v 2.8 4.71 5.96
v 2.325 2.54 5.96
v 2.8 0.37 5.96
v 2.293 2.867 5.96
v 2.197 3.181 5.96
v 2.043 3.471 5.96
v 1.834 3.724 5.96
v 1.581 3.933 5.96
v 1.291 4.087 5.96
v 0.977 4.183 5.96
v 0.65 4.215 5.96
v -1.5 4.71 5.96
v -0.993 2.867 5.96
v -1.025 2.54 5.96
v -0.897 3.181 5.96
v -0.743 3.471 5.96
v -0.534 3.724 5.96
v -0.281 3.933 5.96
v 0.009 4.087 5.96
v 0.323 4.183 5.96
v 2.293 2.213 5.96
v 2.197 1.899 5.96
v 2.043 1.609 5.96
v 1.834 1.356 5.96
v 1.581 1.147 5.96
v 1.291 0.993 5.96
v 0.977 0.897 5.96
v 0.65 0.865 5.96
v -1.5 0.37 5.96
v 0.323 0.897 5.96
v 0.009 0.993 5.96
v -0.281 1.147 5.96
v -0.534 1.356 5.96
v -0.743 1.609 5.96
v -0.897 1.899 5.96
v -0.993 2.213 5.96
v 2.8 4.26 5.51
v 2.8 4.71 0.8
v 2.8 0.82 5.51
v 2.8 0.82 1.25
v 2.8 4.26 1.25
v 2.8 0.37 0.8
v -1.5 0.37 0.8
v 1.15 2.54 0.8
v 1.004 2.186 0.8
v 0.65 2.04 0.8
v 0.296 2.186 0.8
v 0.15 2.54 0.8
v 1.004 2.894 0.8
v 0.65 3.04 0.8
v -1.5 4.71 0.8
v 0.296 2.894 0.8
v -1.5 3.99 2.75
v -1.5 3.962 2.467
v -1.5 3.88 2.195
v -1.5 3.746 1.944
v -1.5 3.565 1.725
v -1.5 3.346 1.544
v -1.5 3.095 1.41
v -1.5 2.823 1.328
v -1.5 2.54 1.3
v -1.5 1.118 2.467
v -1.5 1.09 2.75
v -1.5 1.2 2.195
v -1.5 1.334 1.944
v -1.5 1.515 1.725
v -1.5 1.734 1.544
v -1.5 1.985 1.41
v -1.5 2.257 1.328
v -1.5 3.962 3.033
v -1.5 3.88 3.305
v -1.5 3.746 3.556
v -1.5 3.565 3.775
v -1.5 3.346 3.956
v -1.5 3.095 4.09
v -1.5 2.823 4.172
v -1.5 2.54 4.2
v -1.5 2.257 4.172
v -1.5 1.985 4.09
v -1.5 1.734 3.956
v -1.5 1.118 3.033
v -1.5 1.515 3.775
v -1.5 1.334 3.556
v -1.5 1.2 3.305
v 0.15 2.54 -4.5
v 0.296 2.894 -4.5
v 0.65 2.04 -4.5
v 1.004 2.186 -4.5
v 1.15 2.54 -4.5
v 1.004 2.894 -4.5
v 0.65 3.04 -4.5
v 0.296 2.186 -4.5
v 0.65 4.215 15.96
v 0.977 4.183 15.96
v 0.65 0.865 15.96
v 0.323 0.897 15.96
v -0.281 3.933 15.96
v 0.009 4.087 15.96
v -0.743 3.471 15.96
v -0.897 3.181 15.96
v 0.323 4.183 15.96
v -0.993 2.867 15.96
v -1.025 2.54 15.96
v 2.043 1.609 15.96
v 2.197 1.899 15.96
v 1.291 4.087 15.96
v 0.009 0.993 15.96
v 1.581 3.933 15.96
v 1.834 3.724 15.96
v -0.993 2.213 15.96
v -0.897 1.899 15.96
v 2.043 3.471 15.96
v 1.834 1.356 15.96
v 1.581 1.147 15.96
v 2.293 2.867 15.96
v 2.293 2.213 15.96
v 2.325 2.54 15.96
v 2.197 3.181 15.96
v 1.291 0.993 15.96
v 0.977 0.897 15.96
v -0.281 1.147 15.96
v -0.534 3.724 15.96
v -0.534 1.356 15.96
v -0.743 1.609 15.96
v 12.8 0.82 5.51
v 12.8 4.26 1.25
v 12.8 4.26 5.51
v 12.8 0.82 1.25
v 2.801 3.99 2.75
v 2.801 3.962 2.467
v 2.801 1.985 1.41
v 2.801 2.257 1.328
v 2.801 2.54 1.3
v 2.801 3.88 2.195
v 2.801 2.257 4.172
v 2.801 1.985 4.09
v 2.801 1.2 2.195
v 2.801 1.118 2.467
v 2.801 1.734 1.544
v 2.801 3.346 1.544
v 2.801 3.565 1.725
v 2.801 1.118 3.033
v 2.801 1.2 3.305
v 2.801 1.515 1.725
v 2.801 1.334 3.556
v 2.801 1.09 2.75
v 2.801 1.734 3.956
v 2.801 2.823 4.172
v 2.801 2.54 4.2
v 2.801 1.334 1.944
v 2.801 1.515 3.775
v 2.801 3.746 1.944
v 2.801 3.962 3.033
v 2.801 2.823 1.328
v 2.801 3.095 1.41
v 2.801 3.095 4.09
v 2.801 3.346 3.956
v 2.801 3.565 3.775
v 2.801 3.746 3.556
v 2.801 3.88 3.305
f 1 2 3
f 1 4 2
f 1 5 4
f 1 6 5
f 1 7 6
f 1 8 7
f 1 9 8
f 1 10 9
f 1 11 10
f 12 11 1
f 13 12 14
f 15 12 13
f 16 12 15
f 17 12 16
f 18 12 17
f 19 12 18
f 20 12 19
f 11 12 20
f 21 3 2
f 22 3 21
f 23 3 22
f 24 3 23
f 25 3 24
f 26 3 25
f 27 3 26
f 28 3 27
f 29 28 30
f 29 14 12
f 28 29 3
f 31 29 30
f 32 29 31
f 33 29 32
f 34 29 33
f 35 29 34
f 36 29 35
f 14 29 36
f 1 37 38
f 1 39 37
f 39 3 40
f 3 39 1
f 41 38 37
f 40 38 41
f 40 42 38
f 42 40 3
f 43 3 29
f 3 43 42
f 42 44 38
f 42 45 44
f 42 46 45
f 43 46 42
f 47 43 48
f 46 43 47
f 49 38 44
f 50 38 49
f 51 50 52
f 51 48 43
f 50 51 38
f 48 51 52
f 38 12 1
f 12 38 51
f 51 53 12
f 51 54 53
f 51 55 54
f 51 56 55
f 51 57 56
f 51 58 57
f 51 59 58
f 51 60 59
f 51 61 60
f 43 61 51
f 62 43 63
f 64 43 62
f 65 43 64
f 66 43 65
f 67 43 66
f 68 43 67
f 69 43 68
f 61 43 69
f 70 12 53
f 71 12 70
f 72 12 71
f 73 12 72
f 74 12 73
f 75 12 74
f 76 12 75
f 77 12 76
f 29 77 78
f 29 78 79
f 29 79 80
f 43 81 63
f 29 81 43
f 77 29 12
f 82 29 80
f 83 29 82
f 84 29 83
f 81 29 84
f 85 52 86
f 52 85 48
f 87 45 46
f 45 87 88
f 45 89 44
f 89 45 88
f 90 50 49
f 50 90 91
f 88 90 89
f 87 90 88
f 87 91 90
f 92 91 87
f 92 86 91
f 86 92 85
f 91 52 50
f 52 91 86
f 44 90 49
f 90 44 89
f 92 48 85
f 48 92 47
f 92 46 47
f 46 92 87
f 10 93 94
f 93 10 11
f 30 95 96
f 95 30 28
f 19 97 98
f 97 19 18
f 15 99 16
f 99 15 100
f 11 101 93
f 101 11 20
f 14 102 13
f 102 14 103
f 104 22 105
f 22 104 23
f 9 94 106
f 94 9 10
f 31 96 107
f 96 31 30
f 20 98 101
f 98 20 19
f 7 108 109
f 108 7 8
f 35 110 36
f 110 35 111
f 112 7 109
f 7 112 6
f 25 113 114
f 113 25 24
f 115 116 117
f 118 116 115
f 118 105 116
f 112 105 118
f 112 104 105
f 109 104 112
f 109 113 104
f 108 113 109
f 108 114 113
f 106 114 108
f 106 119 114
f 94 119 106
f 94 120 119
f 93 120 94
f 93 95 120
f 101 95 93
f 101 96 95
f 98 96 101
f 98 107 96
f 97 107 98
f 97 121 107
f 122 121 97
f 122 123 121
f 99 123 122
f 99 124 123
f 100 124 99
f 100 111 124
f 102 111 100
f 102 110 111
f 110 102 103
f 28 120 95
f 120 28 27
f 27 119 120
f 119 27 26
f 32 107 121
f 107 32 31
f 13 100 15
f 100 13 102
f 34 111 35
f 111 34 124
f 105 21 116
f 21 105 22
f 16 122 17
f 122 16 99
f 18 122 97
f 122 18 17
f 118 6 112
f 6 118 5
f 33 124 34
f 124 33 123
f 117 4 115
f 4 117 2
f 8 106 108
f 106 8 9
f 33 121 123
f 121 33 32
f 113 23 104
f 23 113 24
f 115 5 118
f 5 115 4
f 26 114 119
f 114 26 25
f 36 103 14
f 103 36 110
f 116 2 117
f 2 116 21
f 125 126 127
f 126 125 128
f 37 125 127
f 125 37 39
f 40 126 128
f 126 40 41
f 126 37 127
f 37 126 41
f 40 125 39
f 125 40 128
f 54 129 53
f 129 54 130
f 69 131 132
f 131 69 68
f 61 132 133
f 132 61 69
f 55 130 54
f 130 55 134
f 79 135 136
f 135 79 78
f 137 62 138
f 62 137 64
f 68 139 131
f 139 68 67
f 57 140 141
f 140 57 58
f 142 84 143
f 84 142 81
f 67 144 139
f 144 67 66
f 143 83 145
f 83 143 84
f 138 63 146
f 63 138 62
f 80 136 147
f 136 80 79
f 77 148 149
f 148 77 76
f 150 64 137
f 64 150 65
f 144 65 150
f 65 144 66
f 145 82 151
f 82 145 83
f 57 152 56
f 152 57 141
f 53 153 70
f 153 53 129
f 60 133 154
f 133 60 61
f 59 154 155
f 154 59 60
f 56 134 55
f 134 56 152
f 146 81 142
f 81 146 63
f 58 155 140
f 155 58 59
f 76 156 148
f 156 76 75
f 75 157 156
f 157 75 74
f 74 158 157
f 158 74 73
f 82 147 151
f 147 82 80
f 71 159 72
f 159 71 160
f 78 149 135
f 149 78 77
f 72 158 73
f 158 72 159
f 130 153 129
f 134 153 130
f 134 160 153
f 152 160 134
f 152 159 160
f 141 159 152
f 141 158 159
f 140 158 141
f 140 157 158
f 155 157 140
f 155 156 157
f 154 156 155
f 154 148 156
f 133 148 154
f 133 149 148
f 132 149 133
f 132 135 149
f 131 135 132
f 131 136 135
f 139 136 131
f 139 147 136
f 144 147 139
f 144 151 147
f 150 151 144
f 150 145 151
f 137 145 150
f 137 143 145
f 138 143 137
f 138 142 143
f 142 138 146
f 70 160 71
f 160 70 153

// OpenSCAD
// Start: lazy_union
default_5_default_5();
// End: lazy_union

// Modules.

// 'PartMaterial undef-default - default 5.0'
module default_5_default_5() {
  // 'None : _combine_solids_and_holes'
  union() {
    // '_combine_solids_and_holes'
    difference() {
      // 'default : _combine_solids_and_holes'
      union() {
        // 'cage'
        %multmatrix(m=[[-1.0, -0.0, -0.0, 3.8], [-0.0, -1.0, -0.0, 5.08], [0.0, 0.0, 1.0, 0.0], [0.0, 0.0, 0.0, 1.0]]) {
          // 'cage'
          color(c=[0.0, 1.0, 0.35, 0.4]) {
            // 'cage : _combine_solids_and_holes'
            union() {
              // 'cage'
              cube(size=[7.6, 5.08, 10.0]);
            }
          }
        }
        // 'block'
        multmatrix(m=[[-1.0, 0.0, 0.0, 2.8], [0.0, -1.0, 0.0, 4.71], [0.0, 0.0, 1.0, 0.8], [0.0, 0.0, 0.0, 1.0]]) {
          // 'block : _combine_solids_and_holes'
          union() {
            // 'block'
            cube(size=[4.3, 4.34, 5.16]);
          }
        }
        // 'pin'
        multmatrix(m=[[-1.0, 0.0, 0.0, 0.6499999999999999], [0.0, -1.0, 0.0, 2.54], [0.0, 0.0, 1.0, -4.5], [0.0, 0.0, 0.0, 1.0]]) {
          // 'pin : _combine_solids_and_holes'
          union() {
            // 'pin'
            cylinder(h=5.3, r1=0.5, r2=0.5, center=false, $fn=8);
          }
        }
        // 'screw_access'
        multmatrix(m=[[-1.0, 0.0, 0.0, 0.6499999999999999], [0.0, 1.0, 0.0, 2.54], [0.0, 0.0, -1.0, 15.96], [0.0, 0.0, 0.0, 1.0]]) {
          // 'screw_access : _combine_solids_and_holes'
          union() {
            // 'screw_access'
            cylinder(h=10.0, r1=1.675, r2=1.675, center=false, $fn=32);
          }
        }
        // 'block_access'
        multmatrix(m=[[1.0, 0.0, 0.0, 2.8], [0.0, 1.0, 0.0, 0.8200000000000001], [0.0, 0.0, 1.0, 1.25], [0.0, 0.0, 0.0, 1.0]]) {
          // 'block_access : _combine_solids_and_holes'
          union() {
            // 'block_access'
            cube(size=[10.0, 3.44, 4.26]);
          }
        }
      }
      // 'default'
      multmatrix(m=[[0.0, 0.0, -1.0, 2.8009999999999997], [0.0, -1.0, 0.0, 2.54], [-1.0, 0.0, 0.0, 2.75], [0.0, 0.0, 0.0, 1.0]]) {
        // 'term_hole : _combine_solids_and_holes'
        union() {
          // 'term_hole'
          cylinder(h=4.302, r1=1.45, r2=1.45, center=false, $fn=32);
        }
      }
    }
  }
} // end module default_5_default_5
